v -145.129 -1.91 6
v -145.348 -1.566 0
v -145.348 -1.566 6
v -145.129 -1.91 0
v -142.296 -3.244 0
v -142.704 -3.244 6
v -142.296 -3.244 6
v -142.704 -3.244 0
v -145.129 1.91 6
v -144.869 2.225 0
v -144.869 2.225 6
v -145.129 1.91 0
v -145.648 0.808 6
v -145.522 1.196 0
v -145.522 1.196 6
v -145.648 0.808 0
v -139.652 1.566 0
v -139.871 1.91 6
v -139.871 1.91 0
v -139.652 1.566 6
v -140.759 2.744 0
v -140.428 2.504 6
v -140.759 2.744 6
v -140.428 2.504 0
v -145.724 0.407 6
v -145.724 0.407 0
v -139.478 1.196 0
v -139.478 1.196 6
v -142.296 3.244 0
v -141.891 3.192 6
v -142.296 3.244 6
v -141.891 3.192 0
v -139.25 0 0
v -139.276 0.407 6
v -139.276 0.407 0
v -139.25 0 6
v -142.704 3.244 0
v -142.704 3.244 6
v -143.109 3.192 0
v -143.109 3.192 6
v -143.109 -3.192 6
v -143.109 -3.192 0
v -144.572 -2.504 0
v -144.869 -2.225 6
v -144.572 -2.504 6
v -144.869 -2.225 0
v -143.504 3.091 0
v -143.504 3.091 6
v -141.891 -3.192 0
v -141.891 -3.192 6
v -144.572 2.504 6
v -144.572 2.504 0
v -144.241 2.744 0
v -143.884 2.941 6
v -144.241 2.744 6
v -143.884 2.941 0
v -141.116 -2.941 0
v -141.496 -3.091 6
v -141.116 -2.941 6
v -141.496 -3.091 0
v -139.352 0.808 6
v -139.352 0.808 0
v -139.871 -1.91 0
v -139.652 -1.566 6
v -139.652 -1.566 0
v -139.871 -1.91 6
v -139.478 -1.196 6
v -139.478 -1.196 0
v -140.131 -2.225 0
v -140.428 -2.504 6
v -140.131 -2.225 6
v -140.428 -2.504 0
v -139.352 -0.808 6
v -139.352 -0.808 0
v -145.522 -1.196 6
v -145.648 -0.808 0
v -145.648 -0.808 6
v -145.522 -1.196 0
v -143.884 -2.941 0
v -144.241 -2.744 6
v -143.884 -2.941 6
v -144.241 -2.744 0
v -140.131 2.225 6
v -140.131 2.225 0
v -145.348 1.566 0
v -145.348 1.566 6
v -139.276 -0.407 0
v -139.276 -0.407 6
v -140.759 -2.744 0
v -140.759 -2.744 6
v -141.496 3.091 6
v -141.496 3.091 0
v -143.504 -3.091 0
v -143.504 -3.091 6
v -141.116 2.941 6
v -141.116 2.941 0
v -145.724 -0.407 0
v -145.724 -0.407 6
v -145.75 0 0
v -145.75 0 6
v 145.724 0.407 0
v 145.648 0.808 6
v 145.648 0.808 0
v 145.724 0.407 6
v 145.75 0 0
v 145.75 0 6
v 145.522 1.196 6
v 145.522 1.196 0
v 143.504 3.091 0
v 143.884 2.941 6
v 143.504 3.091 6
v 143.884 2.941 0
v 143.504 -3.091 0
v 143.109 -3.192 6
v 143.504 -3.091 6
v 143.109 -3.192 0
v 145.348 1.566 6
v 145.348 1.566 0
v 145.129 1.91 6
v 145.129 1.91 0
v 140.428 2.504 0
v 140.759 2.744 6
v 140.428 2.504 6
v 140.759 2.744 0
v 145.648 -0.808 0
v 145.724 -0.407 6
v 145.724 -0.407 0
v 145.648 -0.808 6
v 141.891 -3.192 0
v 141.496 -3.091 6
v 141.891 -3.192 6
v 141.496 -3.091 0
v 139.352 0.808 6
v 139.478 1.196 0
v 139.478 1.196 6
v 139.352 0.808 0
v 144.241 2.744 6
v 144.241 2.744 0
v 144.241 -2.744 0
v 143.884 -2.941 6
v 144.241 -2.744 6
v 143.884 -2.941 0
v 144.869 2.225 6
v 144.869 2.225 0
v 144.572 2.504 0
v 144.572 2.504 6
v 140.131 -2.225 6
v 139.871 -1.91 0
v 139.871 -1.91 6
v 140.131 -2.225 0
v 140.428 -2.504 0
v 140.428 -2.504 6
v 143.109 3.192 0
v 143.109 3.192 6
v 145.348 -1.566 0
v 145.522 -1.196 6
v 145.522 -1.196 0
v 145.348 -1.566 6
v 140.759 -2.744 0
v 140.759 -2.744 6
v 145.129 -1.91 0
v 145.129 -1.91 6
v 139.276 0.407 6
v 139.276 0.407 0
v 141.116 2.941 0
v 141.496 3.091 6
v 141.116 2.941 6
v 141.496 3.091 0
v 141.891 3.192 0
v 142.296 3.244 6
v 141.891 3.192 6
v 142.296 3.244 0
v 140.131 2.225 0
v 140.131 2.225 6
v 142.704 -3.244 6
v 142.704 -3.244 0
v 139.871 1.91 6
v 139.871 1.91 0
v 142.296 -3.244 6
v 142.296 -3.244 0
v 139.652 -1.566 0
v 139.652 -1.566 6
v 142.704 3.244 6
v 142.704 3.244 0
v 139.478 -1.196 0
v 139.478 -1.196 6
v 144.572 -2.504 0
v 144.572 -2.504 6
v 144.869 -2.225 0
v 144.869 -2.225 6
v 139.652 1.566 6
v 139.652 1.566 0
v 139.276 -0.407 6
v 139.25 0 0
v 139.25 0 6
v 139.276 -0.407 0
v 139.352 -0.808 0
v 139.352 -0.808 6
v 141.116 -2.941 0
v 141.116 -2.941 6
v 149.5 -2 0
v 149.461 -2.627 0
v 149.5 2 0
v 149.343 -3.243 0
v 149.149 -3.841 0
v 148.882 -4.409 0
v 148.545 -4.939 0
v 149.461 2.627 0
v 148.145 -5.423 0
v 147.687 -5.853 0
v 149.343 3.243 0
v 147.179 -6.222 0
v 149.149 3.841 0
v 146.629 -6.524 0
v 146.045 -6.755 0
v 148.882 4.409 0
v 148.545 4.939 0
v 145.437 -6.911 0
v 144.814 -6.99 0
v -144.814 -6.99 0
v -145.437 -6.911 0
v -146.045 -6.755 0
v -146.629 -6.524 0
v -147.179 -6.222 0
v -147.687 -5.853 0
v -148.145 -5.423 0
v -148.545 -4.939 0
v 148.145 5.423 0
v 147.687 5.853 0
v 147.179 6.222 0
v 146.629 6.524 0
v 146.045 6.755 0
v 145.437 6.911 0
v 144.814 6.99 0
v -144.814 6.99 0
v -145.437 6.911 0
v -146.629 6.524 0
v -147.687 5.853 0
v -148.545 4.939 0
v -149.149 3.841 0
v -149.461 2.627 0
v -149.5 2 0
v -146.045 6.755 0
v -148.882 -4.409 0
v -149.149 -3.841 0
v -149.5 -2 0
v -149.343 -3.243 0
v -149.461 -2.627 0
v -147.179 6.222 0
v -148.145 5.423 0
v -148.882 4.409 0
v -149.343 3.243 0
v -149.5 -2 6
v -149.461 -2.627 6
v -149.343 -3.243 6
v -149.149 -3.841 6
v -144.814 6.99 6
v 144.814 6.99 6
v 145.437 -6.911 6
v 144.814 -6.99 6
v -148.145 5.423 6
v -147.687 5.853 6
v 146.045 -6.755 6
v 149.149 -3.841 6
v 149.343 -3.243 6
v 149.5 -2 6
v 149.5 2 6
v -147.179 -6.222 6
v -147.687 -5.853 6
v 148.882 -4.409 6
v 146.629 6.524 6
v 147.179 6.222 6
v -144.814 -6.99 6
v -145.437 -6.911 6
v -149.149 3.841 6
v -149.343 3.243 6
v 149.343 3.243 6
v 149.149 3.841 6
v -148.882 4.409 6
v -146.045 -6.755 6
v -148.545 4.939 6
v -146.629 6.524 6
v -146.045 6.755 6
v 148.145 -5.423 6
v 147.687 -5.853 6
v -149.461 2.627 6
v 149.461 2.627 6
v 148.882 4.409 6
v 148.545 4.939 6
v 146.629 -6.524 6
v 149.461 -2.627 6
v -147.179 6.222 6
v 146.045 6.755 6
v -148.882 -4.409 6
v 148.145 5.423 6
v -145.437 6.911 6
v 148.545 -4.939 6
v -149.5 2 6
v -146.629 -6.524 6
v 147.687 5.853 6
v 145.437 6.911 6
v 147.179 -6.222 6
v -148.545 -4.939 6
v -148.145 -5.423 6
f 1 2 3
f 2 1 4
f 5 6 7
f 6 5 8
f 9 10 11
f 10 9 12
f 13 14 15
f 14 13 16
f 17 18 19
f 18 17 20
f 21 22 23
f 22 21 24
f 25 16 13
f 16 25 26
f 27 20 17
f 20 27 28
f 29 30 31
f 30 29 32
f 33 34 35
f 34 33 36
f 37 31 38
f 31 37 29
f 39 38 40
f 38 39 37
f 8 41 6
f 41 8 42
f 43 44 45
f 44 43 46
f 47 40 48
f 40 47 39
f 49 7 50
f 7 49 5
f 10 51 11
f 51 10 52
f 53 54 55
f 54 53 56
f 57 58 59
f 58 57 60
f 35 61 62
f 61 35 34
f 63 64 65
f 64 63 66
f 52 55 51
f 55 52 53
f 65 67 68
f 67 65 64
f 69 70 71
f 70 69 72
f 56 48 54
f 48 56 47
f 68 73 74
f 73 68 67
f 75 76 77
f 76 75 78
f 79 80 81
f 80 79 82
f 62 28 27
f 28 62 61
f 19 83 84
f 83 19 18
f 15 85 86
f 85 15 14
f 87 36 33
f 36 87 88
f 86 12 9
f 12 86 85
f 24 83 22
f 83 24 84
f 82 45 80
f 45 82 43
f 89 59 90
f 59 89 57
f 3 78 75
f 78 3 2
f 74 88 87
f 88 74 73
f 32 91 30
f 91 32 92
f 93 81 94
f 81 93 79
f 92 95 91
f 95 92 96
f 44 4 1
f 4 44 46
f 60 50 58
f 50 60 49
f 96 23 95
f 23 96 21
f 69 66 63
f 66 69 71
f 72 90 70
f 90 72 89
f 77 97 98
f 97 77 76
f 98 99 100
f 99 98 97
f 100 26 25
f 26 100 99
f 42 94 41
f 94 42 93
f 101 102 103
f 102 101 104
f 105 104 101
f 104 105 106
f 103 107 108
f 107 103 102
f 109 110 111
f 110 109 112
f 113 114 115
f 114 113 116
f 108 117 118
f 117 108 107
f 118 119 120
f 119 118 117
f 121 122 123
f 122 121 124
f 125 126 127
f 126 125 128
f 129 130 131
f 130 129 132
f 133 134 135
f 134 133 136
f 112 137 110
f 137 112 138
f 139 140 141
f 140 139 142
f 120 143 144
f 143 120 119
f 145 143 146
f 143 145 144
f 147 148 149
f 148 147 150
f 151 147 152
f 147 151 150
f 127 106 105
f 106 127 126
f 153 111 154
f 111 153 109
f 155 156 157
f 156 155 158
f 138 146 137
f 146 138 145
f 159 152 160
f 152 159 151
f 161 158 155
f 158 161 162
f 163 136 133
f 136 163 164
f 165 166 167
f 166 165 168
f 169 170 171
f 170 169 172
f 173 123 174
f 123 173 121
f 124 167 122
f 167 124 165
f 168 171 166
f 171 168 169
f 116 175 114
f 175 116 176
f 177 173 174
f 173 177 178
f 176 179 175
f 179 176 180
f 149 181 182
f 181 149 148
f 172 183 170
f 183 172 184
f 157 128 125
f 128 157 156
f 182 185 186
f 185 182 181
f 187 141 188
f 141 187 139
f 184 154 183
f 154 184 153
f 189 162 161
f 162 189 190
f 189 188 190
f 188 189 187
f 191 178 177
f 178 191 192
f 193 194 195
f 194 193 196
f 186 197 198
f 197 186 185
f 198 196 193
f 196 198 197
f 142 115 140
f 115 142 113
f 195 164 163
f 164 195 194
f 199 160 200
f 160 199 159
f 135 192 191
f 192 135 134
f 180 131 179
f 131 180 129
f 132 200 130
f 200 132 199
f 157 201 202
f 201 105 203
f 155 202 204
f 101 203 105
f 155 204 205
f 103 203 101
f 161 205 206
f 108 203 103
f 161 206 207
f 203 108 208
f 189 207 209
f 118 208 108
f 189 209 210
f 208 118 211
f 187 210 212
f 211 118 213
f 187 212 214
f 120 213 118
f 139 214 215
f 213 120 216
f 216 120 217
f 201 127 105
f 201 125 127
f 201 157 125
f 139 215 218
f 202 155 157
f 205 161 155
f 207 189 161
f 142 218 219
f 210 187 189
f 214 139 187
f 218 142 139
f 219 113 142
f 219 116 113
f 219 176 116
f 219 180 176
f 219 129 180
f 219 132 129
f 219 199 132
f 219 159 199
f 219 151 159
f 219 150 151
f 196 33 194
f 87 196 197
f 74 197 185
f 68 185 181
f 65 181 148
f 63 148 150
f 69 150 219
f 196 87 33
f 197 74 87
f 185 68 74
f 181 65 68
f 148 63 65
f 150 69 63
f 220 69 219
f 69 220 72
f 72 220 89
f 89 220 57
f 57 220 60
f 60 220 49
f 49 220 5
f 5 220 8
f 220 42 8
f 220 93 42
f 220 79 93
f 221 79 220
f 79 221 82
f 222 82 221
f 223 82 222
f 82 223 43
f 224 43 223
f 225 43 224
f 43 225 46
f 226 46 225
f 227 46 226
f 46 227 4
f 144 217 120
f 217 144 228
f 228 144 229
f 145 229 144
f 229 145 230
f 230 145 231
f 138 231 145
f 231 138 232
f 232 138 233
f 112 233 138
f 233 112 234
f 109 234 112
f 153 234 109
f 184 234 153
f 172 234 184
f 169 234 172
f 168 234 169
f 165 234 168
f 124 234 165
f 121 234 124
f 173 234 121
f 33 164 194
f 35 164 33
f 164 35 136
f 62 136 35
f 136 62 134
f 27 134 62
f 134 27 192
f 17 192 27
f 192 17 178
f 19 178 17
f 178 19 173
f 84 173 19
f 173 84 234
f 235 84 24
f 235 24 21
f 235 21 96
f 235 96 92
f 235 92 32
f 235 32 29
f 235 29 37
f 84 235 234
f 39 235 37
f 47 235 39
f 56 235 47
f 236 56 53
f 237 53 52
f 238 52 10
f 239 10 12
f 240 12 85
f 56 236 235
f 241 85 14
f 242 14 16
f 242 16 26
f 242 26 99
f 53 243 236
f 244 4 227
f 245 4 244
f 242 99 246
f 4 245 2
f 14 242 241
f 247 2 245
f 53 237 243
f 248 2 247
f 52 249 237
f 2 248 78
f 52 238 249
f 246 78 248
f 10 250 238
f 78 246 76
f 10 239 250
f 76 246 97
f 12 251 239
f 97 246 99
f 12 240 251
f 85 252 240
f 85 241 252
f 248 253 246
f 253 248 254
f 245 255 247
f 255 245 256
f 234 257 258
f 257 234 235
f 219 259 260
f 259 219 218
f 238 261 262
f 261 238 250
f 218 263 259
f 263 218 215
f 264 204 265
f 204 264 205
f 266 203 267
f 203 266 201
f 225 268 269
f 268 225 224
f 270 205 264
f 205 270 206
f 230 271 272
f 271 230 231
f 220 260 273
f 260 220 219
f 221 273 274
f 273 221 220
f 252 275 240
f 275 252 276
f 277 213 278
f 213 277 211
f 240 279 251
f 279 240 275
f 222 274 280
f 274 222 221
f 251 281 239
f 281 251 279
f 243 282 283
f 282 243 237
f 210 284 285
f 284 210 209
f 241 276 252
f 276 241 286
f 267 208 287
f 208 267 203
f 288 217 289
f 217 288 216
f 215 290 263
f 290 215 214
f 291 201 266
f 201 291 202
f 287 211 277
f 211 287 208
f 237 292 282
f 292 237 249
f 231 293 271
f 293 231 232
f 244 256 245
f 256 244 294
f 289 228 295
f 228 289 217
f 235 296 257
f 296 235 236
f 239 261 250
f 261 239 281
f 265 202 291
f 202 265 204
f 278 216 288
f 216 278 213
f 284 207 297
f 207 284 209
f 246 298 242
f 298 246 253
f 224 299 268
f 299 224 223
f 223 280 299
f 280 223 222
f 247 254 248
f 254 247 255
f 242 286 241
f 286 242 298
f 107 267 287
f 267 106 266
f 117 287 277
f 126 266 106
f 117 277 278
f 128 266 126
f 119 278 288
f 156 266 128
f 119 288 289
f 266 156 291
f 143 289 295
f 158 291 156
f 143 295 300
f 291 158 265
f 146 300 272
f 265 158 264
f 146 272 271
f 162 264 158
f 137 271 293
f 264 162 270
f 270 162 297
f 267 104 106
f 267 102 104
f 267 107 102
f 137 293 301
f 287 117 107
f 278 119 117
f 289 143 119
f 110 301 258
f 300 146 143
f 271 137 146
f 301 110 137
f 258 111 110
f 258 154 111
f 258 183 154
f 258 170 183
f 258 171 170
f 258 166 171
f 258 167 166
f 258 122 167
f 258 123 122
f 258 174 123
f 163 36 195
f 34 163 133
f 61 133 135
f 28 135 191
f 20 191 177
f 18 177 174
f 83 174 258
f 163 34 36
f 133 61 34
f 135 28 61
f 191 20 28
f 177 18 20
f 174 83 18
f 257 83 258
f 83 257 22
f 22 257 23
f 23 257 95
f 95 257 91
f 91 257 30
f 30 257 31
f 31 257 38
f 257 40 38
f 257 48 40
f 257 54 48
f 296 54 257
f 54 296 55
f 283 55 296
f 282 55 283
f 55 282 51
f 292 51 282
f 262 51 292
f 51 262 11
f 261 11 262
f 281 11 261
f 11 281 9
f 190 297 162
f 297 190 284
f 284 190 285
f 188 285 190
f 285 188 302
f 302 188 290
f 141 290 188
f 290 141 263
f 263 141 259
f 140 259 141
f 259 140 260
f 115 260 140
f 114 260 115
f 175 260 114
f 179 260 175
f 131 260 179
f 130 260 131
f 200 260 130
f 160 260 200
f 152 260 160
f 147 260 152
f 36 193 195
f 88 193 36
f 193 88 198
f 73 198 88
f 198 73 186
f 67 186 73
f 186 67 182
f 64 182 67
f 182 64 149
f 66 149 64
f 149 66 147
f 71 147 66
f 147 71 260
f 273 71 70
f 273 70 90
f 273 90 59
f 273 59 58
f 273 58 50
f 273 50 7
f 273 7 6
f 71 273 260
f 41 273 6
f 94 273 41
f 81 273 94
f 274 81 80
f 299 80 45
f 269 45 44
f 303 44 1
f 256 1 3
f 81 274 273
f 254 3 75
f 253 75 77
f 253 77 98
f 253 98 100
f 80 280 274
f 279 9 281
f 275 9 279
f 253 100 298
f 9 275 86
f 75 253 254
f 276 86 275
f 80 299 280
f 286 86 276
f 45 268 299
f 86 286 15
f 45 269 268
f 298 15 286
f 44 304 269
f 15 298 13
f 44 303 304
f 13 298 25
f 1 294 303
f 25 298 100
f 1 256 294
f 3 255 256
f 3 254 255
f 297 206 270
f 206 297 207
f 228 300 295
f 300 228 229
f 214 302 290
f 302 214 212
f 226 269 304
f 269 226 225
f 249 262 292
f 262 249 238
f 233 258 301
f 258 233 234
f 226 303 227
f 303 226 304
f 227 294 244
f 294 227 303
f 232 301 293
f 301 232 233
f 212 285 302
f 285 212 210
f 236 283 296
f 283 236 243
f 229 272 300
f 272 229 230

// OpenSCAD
$fn = 50;


difference() {
	union() {
		hull() {
			translate(v = [-144.5000000000, 2.0000000000, 0]) {
				cylinder(h = 6, r = 5);
			}
			translate(v = [144.5000000000, 2.0000000000, 0]) {
				cylinder(h = 6, r = 5);
			}
			translate(v = [-144.5000000000, -2.0000000000, 0]) {
				cylinder(h = 6, r = 5);
			}
			translate(v = [144.5000000000, -2.0000000000, 0]) {
				cylinder(h = 6, r = 5);
			}
		}
	}
	union() {
		translate(v = [-142.5000000000, 0.0000000000, -100.0000000000]) {
			cylinder(h = 200, r = 3.2500000000);
		}
		translate(v = [-142.5000000000, 0.0000000000, -100.0000000000]) {
			cylinder(h = 200, r = 3.2500000000);
		}
		translate(v = [142.5000000000, 0.0000000000, -100.0000000000]) {
			cylinder(h = 200, r = 3.2500000000);
		}
		translate(v = [142.5000000000, 0.0000000000, -100.0000000000]) {
			cylinder(h = 200, r = 3.2500000000);
		}
	}
}
